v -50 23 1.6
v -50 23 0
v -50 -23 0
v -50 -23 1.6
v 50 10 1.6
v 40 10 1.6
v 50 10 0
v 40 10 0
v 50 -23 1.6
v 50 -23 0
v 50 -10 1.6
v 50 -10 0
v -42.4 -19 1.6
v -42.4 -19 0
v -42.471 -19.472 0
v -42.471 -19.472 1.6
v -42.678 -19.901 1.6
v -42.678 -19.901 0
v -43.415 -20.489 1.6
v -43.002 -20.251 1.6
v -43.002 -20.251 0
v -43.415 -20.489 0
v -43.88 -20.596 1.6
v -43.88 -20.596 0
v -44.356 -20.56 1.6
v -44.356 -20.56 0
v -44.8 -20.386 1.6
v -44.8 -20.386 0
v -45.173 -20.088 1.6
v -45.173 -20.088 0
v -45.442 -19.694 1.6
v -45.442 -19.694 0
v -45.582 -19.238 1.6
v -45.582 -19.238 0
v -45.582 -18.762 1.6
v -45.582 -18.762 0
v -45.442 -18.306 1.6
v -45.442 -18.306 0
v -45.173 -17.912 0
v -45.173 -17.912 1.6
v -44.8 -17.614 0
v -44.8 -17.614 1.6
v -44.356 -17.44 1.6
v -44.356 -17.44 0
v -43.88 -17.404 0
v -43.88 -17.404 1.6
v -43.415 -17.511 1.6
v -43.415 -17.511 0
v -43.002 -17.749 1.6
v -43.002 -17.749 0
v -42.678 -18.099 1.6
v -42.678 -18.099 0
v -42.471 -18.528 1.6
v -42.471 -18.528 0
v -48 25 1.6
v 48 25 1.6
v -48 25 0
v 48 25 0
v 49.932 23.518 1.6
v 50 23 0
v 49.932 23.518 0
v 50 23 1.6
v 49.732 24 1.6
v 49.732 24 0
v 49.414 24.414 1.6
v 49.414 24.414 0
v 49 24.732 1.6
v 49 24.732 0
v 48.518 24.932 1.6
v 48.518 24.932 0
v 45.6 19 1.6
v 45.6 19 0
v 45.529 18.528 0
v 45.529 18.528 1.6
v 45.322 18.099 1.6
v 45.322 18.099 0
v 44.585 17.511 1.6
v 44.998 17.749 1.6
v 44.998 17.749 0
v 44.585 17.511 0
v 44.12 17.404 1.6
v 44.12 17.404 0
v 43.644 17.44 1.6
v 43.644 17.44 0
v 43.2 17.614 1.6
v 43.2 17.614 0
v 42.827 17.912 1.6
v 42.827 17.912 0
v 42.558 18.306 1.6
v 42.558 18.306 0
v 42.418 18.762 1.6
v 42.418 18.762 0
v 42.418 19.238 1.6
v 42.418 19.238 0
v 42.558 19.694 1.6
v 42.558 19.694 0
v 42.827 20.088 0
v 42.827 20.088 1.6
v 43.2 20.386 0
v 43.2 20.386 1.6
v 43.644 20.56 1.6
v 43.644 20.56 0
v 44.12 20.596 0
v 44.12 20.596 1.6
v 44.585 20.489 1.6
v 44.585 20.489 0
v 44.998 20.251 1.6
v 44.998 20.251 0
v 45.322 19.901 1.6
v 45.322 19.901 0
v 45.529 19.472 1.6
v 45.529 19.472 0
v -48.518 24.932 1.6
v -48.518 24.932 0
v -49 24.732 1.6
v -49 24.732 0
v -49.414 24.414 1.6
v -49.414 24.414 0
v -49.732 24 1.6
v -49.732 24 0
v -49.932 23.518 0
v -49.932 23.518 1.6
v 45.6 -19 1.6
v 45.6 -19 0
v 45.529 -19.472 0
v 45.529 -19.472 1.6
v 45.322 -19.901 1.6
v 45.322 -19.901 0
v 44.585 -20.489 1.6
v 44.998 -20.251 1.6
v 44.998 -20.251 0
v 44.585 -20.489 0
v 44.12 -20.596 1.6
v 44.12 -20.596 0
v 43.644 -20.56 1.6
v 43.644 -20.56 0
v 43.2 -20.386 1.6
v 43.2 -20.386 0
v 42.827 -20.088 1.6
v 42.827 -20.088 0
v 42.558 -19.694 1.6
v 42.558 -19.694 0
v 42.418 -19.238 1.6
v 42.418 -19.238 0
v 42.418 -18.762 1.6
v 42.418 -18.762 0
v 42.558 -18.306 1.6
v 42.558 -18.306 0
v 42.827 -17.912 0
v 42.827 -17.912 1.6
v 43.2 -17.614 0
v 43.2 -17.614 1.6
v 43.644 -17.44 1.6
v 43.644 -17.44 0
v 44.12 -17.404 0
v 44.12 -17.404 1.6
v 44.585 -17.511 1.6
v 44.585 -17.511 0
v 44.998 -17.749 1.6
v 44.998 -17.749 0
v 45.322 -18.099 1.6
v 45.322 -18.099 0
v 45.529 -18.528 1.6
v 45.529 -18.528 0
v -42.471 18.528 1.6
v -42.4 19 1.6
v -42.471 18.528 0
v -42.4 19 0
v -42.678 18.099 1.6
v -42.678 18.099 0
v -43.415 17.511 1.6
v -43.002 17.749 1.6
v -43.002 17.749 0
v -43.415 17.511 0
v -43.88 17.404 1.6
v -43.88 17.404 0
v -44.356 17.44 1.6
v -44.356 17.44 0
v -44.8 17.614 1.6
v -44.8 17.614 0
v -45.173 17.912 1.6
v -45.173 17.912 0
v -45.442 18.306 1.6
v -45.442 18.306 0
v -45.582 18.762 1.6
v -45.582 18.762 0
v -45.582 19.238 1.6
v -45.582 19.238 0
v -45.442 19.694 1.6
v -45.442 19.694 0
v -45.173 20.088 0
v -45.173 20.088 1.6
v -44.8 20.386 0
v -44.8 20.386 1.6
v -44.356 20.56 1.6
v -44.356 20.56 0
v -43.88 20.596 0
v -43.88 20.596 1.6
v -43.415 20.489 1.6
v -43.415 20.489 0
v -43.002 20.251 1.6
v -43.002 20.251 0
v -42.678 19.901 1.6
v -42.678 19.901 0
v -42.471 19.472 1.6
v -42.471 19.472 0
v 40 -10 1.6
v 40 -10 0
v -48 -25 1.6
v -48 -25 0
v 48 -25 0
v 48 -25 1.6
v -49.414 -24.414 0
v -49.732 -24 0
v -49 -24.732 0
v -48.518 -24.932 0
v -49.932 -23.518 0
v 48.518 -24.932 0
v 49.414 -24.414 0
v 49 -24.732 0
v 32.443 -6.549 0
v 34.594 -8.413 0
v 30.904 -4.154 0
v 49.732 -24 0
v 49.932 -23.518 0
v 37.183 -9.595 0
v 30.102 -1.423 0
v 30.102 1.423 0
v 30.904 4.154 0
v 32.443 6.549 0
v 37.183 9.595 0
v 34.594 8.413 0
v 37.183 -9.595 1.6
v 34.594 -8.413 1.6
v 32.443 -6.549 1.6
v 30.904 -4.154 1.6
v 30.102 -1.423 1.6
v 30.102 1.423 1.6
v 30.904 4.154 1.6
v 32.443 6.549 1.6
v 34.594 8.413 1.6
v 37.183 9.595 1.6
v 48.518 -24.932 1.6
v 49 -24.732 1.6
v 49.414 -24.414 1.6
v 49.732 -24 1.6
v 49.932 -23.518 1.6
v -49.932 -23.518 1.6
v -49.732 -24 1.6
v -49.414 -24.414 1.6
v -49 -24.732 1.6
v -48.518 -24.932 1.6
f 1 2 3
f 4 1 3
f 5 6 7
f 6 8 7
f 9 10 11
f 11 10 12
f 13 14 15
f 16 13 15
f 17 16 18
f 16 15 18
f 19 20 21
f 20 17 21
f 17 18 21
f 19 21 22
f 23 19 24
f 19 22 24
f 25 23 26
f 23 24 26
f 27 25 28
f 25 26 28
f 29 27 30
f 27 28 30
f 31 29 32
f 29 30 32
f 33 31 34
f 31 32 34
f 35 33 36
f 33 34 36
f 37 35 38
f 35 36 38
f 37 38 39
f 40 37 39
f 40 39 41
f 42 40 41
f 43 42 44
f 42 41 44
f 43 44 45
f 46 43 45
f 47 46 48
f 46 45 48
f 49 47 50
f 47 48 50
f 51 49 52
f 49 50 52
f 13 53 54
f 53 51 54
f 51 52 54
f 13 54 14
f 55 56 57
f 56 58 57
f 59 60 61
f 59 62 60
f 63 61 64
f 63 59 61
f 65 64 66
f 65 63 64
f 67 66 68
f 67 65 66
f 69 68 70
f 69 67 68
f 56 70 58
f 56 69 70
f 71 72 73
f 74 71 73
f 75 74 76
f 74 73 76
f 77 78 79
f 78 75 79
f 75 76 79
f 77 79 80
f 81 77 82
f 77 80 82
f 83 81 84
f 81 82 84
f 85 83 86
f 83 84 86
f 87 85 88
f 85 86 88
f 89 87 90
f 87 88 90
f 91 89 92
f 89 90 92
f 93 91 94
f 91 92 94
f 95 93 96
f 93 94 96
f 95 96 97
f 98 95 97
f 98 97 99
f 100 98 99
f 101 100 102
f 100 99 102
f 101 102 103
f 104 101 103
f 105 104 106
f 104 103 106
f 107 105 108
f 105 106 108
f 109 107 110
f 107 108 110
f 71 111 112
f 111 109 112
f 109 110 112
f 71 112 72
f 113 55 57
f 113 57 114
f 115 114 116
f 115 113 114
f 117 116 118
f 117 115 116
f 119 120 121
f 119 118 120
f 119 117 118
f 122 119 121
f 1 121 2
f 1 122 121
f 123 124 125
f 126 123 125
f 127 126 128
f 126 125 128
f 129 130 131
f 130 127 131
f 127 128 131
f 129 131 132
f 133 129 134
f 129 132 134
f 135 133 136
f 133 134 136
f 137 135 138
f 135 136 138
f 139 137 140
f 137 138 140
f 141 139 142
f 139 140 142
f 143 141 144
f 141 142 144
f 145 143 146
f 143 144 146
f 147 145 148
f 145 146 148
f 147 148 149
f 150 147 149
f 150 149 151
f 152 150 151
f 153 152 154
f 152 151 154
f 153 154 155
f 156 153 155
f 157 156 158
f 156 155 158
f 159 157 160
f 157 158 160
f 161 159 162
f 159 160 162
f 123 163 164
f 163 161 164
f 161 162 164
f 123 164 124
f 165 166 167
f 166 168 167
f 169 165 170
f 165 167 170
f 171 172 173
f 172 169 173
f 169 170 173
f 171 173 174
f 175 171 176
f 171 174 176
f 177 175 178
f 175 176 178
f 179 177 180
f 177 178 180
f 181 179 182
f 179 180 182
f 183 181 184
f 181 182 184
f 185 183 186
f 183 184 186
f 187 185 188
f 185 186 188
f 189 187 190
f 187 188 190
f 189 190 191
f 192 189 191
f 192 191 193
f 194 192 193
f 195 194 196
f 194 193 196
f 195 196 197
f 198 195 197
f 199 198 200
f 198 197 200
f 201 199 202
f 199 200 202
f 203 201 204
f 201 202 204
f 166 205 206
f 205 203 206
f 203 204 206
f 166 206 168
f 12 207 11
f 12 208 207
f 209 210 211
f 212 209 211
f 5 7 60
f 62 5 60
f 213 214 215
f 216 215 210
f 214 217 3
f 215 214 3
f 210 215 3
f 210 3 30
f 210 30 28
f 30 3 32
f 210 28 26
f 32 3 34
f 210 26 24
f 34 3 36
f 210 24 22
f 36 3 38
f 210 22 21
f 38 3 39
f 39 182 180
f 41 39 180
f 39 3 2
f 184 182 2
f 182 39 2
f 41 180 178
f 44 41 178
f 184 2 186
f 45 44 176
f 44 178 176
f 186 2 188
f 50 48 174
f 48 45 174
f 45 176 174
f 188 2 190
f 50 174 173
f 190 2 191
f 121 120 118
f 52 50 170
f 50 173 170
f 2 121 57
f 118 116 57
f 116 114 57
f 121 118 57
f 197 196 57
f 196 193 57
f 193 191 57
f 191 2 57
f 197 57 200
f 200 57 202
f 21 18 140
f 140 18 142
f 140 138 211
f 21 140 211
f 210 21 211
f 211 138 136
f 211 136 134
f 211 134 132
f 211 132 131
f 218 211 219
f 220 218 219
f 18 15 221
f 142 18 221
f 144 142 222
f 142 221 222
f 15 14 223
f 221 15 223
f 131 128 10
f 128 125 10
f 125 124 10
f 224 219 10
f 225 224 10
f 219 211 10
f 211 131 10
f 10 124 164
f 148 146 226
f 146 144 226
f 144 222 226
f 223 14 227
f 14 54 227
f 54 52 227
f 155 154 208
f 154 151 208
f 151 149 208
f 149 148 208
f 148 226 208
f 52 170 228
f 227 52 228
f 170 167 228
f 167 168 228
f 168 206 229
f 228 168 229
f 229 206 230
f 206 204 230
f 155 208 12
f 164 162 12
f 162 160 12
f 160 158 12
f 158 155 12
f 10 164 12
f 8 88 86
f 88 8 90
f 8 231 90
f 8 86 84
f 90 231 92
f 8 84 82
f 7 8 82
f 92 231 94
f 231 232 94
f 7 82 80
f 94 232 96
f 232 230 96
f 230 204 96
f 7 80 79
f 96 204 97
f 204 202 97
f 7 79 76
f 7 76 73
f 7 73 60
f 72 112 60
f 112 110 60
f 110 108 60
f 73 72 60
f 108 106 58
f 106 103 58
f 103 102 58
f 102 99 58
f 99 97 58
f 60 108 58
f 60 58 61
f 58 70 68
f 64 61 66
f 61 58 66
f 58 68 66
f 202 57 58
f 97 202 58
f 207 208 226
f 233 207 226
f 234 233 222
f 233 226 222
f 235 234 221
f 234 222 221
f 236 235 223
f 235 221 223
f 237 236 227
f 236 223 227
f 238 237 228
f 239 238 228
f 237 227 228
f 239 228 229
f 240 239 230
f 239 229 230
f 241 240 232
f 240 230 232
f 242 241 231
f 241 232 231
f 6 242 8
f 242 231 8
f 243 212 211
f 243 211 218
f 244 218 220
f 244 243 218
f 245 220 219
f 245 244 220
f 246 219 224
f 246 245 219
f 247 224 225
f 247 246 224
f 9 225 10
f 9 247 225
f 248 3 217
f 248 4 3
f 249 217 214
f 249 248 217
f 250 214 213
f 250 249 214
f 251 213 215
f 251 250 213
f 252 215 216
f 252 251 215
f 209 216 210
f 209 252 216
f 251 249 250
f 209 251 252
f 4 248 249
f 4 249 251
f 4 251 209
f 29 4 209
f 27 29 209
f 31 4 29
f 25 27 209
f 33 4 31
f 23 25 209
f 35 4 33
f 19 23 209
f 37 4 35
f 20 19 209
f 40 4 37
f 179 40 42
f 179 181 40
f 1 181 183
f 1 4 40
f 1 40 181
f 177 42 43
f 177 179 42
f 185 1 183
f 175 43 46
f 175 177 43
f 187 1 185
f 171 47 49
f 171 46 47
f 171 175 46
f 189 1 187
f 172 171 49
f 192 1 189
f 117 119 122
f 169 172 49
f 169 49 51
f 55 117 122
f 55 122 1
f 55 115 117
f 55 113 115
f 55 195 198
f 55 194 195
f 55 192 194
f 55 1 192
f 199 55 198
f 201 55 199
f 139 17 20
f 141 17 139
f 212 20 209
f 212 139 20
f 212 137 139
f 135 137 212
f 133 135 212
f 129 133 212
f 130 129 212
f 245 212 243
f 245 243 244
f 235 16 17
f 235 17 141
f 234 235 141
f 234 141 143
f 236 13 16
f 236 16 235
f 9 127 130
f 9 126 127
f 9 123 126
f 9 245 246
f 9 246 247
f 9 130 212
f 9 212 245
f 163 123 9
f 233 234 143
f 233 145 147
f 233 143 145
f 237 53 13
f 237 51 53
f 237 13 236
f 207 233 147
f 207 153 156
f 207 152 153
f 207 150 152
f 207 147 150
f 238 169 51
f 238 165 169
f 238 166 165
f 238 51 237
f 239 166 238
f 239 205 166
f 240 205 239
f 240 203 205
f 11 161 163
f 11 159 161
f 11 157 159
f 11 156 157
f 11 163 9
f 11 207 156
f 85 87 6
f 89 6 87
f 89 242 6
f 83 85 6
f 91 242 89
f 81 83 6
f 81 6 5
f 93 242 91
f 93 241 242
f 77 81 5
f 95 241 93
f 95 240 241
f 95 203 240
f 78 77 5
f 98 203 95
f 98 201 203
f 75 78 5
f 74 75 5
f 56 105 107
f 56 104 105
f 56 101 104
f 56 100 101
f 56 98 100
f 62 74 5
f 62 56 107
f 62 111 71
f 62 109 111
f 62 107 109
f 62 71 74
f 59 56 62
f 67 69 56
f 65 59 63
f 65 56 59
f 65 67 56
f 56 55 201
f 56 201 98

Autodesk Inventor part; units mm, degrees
ref_plane "YZ Plane" through (0, 0, 0) normal (1, 0, 0) x (0, 1, 0)
ref_plane "XZ Plane" through (0, 0, 0) normal (0, 1, 0) x (-1, 0, 0)
ref_plane "XY Plane" through (0, 0, 0) normal (0, 0, 1) x (1, 0, 0)
sketch "Sketch1" plane through (0, 0, 0) normal (0, 0, 1) x (1, 0, 0)
  line L0 (-50, -25) -> (50, -25)
  line L1 (50, -25) -> (50, 25)
  line L2 (50, 25) -> (-50, 25)
  line L3 (-50, 25) -> (-50, -25)
  line L4 (-50, -25) -> (50, 25) construction
  line L5 (50, -25) -> (-50, 25) construction
  circle A0 centre (44, 19) radius 1.6
  line L6 (0, 35.5799) -> (0, -35.5799) projected
  line L7 (-70.5799, 0) -> (70.5799, 0) projected
  circle A1 centre (44, 19) radius 5 construction
  circle A2 centre (-44, 19) radius 1.6
  circle A3 centre (-44, 19) radius 5 construction
  circle A4 centre (44, -19) radius 1.6
  circle A5 centre (44, -19) radius 5 construction
  circle A6 centre (-44, -19) radius 1.6
  circle A7 centre (-44, -19) radius 5 construction
  circle A8 centre (40, 0) radius 10
  line L8 (40, 10) -> (50, 10)
  line L9 (40, -10) -> (50, -10)
  point P0 (0, 0)
  dimension "d0" = 100
  dimension "d1" = 50
  dimension "d2" = 6
  dimension "d3" = 6
  dimension "d4" = 3.2
  dimension "d5" = 10
  dimension "d9" = 20
  dimension "d10" = 10
extrude "Extrusion1" add sketch "Sketch1" along normal blind 1.6 contours L3 L7 L6 L0 | L6 L7 A8 L9 L1 L0 | L3 L2 L6 L7 | L6 L2 L1 L8 A8 L7
fillet "Fillet1" radius 2 4 edges at (-50, 25, 0.8) (50, 25, 0.8) (50, -25, 0.8) (-50, -25, 0.8)
sketch "MCU_Power_PCB_Outline" plane through (0, 0, 1.6) normal (0, 0, 1) x (1, 0, 0)
  arc A0 (-50, -23) -> (-48, -25) centre (-48, -23) ccw projected
  line L0 (-48, -25) -> (48, -25) projected
  arc A1 (48, -25) -> (50, -23) centre (48, -23) ccw projected
  line L1 (50, -23) -> (50, -10) projected
  arc A2 (50, 23) -> (48, 25) centre (48, 23) ccw projected
  line L2 (48, 25) -> (-48, 25) projected
  arc A3 (-48, 25) -> (-50, 23) centre (-48, 23) ccw projected
  line L3 (-50, 23) -> (-50, -23) projected
  circle A4 centre (-44, -19) radius 1.6 projected
  circle A5 centre (44, -19) radius 1.6 projected
  circle A6 centre (44, 19) radius 1.6 projected
  circle A7 centre (-44, 19) radius 1.6 projected
  line L4 (50, -10) -> (40, -10) projected
  arc A8 (40, 10) -> (40, -10) centre (40, 0) ccw projected
  line L5 (40, 10) -> (50, 10) projected
  line L6 (50, 10) -> (50, 23) projected
  point P0 (0, 0)
equation "\"d3\" = d2"
properties part number "MCU_Power_PCB"
